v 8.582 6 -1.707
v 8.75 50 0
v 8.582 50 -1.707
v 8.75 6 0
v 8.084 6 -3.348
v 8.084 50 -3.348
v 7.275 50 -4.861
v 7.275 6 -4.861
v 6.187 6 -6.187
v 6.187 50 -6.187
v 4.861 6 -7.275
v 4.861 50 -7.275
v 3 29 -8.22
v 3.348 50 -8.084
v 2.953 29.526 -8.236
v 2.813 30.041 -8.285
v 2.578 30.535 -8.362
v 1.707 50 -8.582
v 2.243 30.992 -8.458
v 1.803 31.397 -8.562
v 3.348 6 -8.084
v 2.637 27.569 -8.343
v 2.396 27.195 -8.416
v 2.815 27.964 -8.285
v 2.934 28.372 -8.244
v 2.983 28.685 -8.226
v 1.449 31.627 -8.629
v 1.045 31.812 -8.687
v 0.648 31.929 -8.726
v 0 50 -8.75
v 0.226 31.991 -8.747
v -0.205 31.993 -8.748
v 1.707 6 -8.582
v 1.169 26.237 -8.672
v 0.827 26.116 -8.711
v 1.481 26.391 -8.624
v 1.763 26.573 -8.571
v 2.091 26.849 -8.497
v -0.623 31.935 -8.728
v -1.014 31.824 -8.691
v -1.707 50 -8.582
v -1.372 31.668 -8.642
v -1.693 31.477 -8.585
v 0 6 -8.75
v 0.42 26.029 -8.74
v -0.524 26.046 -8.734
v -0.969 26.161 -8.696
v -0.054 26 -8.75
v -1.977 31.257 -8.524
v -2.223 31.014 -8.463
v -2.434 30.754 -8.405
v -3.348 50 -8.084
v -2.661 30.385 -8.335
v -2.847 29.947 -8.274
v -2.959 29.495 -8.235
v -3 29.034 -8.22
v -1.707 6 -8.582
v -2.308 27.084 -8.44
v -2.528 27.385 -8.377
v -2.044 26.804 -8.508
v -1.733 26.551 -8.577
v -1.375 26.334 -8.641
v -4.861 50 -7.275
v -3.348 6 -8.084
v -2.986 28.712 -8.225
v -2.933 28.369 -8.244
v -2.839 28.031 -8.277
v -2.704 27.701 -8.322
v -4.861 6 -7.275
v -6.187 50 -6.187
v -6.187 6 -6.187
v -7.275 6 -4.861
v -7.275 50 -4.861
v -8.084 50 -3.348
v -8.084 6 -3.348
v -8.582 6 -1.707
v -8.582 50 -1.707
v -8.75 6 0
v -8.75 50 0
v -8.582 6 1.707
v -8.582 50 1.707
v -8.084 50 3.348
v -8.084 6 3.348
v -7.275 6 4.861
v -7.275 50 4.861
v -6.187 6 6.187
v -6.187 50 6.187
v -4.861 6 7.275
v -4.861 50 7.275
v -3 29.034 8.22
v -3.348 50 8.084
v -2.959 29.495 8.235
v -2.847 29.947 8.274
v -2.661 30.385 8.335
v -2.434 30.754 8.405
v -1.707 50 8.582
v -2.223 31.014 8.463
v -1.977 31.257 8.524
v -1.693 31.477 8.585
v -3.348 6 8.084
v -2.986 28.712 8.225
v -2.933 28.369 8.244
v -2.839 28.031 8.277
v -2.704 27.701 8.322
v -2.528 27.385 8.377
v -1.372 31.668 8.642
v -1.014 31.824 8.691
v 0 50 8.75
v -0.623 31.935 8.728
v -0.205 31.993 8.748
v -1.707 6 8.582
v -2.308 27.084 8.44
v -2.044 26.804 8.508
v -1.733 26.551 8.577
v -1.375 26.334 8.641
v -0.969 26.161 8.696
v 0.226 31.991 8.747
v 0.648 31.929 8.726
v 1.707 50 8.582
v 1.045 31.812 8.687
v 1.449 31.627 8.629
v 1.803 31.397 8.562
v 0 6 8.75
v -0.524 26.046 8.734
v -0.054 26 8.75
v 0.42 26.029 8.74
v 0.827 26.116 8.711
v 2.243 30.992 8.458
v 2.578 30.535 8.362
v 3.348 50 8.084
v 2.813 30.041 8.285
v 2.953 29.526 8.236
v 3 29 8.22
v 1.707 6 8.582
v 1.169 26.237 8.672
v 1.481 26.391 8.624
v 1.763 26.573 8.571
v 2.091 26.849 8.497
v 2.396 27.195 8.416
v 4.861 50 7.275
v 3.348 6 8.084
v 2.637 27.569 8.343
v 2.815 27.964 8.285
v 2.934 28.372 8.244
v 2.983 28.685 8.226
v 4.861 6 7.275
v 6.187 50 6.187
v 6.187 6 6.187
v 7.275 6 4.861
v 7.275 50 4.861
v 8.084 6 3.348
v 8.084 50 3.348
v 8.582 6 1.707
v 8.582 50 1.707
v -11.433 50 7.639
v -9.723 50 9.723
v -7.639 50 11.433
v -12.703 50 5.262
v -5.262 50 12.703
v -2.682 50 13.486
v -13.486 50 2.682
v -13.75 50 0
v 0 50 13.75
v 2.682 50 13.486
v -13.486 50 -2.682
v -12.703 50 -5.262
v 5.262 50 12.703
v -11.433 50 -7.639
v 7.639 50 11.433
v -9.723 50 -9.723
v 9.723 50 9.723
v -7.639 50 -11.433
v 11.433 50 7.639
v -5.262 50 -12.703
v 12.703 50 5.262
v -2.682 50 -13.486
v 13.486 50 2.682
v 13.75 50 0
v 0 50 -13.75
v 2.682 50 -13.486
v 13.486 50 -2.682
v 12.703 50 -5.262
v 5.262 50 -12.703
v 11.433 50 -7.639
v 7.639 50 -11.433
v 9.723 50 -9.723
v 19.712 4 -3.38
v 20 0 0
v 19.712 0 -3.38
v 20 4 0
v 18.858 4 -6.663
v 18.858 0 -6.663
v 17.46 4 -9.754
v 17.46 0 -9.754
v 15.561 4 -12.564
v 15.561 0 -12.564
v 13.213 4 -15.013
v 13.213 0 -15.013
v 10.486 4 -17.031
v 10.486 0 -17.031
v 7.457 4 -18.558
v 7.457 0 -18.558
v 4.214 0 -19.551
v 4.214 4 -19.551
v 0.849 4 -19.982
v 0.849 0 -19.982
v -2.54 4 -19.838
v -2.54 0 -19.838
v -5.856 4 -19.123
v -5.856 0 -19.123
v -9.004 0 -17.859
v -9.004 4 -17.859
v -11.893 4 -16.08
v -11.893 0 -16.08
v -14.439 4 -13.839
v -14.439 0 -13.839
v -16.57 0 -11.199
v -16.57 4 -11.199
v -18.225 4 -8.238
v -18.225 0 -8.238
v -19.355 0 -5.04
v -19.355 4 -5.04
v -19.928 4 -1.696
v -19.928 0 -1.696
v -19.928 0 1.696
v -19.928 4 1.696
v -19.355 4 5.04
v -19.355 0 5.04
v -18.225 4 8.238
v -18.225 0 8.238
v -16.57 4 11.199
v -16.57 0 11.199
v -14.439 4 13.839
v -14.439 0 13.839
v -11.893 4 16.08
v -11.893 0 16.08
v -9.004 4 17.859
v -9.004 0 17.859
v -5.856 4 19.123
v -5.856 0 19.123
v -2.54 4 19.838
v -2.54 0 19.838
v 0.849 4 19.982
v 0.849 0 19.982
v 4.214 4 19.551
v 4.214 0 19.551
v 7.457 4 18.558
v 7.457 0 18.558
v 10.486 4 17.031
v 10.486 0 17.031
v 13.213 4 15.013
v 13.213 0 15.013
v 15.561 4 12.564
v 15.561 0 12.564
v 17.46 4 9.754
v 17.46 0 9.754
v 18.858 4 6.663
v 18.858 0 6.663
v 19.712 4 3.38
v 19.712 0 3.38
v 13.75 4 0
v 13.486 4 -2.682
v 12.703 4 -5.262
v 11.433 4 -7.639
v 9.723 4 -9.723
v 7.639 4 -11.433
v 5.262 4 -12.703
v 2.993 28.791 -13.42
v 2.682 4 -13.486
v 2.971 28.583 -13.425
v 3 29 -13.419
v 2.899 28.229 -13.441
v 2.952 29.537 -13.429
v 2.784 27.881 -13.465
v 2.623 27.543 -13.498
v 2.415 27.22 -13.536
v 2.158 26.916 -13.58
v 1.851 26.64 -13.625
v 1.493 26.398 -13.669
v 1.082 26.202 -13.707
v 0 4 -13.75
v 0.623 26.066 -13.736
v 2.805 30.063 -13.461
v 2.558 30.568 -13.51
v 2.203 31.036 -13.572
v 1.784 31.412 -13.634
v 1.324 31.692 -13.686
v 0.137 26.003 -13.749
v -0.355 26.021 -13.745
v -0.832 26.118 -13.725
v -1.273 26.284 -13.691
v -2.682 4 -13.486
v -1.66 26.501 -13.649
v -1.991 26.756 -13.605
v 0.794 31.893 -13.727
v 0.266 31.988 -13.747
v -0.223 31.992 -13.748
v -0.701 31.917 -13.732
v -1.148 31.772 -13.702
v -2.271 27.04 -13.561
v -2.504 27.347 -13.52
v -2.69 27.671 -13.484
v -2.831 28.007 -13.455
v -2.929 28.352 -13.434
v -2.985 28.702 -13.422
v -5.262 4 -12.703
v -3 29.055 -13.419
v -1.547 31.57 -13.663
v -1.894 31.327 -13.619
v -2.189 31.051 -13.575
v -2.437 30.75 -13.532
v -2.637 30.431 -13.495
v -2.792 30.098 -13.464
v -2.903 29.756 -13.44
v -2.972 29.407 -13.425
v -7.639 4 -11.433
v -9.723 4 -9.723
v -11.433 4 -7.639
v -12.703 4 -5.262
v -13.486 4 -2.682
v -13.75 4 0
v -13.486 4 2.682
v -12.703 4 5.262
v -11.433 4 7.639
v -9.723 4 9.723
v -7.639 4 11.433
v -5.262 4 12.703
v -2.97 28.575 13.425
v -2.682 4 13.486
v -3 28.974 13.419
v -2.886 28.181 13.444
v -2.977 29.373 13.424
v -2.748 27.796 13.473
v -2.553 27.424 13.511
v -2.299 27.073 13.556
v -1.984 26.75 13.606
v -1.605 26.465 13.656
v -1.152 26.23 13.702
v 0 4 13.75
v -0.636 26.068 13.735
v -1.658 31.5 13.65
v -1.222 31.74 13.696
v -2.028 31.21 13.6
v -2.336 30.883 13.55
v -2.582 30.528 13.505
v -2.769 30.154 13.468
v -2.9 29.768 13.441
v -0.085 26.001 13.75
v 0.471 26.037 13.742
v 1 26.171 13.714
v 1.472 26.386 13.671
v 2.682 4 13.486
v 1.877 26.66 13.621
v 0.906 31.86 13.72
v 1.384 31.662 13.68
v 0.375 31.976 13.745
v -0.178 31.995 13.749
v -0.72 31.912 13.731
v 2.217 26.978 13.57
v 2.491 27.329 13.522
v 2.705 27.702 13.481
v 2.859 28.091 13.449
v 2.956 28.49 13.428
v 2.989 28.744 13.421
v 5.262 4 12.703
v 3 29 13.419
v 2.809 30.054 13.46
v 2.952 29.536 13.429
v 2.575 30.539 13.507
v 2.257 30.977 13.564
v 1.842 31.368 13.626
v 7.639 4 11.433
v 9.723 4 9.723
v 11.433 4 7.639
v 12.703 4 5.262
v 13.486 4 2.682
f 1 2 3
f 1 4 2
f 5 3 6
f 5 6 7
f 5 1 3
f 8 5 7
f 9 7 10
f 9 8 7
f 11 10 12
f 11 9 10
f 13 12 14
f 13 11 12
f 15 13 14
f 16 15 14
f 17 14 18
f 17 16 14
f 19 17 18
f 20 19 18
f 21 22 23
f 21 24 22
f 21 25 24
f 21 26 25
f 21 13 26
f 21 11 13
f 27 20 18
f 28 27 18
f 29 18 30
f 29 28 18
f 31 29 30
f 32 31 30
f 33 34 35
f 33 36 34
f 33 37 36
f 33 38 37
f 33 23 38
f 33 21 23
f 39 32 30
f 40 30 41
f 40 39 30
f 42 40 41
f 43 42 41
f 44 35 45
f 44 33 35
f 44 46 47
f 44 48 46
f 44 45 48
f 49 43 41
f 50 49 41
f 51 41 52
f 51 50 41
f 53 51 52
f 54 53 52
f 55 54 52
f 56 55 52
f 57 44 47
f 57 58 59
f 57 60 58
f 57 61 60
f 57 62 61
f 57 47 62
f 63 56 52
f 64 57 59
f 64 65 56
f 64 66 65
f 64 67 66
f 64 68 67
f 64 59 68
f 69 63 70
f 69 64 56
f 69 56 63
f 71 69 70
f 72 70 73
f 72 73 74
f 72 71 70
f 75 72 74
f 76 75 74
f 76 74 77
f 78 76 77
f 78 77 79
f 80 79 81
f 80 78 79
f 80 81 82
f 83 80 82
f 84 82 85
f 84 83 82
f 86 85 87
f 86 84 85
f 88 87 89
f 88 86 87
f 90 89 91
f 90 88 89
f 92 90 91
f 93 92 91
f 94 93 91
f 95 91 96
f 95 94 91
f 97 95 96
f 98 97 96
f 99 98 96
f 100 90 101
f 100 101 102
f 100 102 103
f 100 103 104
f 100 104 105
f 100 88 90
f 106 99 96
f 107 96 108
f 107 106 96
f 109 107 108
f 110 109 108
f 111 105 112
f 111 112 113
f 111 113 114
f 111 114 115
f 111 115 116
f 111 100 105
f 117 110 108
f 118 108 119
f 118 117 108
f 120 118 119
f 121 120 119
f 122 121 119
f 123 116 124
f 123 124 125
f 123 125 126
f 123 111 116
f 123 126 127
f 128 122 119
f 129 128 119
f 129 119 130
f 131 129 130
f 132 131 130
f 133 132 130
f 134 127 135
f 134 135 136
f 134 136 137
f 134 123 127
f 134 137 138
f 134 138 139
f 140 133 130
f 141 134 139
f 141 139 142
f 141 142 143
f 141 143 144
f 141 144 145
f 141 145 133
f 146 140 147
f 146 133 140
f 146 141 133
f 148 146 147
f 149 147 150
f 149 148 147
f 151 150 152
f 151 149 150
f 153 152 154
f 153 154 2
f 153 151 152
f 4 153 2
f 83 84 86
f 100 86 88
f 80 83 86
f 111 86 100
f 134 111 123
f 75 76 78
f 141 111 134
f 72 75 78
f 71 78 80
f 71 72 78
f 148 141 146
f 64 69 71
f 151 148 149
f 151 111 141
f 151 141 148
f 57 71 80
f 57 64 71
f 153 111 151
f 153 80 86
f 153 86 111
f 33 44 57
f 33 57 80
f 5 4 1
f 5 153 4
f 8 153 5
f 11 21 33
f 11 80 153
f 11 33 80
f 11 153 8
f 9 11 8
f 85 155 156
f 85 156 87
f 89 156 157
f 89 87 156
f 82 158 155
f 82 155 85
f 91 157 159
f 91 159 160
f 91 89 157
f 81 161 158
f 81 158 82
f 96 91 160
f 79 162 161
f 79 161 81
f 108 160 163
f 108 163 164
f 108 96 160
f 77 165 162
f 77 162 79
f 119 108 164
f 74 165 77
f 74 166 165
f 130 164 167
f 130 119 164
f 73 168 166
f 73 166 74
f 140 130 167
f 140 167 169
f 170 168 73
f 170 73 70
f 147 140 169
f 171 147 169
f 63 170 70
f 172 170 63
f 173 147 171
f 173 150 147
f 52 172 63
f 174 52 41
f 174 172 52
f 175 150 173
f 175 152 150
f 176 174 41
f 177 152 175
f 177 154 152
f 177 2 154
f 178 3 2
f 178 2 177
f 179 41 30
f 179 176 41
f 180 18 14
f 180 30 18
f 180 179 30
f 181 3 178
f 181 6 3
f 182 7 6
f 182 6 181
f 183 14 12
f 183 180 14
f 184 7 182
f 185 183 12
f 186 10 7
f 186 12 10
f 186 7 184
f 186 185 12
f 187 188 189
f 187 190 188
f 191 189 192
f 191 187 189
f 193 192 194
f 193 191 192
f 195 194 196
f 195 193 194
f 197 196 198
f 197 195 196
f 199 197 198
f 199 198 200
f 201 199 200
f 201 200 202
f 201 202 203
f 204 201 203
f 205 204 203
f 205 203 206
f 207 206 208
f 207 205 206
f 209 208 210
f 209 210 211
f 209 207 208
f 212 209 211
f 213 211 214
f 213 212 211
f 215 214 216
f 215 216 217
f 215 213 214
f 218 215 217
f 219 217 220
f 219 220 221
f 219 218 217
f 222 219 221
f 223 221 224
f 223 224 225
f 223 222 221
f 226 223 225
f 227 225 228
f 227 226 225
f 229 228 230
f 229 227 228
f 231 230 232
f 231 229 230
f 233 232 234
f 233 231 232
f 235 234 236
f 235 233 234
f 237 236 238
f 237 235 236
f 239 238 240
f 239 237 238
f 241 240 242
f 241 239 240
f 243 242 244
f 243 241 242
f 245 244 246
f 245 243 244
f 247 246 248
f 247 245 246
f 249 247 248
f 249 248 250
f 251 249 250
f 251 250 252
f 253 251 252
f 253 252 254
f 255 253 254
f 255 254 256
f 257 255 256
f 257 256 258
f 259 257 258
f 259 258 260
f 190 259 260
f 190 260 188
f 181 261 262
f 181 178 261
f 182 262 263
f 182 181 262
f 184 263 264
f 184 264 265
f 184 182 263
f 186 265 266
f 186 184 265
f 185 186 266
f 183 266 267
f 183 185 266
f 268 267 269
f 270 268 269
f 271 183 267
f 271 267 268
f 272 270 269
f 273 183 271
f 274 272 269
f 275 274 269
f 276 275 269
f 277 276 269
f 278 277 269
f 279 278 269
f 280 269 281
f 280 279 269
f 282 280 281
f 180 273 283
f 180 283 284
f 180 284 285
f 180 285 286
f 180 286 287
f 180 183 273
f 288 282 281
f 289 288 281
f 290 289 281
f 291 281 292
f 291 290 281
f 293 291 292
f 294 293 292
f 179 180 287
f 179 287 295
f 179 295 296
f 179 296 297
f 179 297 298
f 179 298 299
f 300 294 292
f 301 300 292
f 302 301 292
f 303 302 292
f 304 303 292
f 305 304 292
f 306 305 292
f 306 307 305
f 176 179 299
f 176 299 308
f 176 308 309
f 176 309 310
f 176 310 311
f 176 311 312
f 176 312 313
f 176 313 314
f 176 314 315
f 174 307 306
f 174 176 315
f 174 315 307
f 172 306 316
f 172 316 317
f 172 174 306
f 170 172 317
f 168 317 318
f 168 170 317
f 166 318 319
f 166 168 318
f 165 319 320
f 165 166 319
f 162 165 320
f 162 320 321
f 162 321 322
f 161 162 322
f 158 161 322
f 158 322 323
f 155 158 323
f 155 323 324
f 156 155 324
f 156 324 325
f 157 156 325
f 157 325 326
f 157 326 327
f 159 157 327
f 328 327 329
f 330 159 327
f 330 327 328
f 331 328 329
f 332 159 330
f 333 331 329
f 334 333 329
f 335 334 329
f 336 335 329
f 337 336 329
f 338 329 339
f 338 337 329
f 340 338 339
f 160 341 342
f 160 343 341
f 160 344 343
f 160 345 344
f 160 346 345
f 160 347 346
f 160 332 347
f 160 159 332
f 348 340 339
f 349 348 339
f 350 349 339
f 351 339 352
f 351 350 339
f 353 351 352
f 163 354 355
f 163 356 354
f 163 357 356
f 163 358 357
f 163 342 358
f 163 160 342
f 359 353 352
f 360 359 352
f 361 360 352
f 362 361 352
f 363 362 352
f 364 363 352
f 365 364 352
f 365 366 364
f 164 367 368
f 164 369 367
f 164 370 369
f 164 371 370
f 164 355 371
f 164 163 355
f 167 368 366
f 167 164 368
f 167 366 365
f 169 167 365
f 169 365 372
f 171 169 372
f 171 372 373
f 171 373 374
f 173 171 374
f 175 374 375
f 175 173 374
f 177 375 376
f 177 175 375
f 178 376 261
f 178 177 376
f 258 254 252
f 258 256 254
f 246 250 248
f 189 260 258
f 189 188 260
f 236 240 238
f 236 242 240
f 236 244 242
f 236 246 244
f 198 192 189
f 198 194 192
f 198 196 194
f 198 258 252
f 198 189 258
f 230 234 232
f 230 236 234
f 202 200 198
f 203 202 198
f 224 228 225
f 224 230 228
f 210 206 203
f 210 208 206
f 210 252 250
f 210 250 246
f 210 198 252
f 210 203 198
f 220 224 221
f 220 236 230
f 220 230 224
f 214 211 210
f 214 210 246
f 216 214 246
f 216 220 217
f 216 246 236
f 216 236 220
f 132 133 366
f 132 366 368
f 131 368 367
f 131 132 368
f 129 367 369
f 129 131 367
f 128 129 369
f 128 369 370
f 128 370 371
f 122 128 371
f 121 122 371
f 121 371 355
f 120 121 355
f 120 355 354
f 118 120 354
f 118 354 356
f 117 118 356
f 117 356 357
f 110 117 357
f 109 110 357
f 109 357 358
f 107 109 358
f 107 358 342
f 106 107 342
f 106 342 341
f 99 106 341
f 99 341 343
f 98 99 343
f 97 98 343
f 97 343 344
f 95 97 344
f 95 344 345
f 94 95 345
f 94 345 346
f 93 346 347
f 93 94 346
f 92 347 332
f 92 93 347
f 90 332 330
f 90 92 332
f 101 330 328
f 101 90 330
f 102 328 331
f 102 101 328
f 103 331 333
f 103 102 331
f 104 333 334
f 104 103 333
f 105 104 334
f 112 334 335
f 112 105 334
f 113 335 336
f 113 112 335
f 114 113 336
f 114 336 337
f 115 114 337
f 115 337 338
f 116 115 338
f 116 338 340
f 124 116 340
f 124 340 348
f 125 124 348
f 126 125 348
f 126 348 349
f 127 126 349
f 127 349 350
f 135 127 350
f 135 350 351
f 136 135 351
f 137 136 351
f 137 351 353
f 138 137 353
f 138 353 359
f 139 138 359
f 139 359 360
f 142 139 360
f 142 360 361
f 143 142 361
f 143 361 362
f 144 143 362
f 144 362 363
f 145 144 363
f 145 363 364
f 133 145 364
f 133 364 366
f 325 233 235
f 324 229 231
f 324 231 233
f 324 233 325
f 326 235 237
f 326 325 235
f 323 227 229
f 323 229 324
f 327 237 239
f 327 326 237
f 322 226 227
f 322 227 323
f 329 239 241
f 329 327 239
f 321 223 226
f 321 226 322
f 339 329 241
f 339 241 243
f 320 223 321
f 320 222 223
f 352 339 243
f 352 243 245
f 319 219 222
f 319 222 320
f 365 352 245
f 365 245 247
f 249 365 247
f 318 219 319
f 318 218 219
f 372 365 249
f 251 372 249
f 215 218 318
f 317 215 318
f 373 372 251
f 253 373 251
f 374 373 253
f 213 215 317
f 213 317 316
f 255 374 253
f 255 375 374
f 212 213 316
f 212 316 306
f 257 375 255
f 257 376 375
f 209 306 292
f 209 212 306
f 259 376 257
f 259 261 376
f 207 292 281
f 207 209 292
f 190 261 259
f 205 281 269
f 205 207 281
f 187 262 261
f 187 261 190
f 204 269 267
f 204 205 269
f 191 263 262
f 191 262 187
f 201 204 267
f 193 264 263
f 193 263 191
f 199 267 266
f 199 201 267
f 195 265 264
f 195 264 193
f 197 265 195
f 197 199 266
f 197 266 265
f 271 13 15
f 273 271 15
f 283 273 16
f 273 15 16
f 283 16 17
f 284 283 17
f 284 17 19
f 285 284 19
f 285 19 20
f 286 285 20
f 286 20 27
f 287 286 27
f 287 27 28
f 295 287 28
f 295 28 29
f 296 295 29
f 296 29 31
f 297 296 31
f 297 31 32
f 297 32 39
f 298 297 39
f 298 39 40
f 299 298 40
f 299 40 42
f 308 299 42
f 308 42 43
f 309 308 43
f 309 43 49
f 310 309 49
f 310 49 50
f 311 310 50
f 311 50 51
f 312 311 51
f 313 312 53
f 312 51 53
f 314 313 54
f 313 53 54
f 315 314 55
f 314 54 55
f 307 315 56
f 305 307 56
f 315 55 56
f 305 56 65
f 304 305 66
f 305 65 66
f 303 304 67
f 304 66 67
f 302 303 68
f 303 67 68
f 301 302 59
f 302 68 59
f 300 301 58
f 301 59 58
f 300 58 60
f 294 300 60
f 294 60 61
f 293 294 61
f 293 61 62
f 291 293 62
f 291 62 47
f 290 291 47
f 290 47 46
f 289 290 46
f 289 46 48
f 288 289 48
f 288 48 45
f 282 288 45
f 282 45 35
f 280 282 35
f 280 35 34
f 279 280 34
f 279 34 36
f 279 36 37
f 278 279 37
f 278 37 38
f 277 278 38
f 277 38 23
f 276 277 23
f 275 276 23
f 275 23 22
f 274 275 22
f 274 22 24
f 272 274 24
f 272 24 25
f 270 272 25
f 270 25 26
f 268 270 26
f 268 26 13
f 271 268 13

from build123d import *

# Parameters (mm, degrees)
SKETCH001_R = 3
HOLE_DEPTH  = 170.997689


with BuildPart() as part:
    # Sketch → Revolution (revolve)
    with BuildSketch(Plane.XY):
        Polygon((0, 0), (20, 0), (20, 4), (13.75, 4), (13.75, 50), (8.75, 50), (8.75, 6), (0, 6), align=None)
    revolve(axis=Axis((0, 0, 0), (0, 1, 0)))

    # Sketch001 → Hole (cut, through all)
    with BuildSketch(Plane.XY):
        with Locations((0, 29)):
            Circle(SKETCH001_R)
    hole = extrude(amount=-HOLE_DEPTH, mode=Mode.SUBTRACT)

    # Mirrored: Hole across XY
    add(hole.mirror(Plane.XY), mode=Mode.SUBTRACT)


solid = part.part
